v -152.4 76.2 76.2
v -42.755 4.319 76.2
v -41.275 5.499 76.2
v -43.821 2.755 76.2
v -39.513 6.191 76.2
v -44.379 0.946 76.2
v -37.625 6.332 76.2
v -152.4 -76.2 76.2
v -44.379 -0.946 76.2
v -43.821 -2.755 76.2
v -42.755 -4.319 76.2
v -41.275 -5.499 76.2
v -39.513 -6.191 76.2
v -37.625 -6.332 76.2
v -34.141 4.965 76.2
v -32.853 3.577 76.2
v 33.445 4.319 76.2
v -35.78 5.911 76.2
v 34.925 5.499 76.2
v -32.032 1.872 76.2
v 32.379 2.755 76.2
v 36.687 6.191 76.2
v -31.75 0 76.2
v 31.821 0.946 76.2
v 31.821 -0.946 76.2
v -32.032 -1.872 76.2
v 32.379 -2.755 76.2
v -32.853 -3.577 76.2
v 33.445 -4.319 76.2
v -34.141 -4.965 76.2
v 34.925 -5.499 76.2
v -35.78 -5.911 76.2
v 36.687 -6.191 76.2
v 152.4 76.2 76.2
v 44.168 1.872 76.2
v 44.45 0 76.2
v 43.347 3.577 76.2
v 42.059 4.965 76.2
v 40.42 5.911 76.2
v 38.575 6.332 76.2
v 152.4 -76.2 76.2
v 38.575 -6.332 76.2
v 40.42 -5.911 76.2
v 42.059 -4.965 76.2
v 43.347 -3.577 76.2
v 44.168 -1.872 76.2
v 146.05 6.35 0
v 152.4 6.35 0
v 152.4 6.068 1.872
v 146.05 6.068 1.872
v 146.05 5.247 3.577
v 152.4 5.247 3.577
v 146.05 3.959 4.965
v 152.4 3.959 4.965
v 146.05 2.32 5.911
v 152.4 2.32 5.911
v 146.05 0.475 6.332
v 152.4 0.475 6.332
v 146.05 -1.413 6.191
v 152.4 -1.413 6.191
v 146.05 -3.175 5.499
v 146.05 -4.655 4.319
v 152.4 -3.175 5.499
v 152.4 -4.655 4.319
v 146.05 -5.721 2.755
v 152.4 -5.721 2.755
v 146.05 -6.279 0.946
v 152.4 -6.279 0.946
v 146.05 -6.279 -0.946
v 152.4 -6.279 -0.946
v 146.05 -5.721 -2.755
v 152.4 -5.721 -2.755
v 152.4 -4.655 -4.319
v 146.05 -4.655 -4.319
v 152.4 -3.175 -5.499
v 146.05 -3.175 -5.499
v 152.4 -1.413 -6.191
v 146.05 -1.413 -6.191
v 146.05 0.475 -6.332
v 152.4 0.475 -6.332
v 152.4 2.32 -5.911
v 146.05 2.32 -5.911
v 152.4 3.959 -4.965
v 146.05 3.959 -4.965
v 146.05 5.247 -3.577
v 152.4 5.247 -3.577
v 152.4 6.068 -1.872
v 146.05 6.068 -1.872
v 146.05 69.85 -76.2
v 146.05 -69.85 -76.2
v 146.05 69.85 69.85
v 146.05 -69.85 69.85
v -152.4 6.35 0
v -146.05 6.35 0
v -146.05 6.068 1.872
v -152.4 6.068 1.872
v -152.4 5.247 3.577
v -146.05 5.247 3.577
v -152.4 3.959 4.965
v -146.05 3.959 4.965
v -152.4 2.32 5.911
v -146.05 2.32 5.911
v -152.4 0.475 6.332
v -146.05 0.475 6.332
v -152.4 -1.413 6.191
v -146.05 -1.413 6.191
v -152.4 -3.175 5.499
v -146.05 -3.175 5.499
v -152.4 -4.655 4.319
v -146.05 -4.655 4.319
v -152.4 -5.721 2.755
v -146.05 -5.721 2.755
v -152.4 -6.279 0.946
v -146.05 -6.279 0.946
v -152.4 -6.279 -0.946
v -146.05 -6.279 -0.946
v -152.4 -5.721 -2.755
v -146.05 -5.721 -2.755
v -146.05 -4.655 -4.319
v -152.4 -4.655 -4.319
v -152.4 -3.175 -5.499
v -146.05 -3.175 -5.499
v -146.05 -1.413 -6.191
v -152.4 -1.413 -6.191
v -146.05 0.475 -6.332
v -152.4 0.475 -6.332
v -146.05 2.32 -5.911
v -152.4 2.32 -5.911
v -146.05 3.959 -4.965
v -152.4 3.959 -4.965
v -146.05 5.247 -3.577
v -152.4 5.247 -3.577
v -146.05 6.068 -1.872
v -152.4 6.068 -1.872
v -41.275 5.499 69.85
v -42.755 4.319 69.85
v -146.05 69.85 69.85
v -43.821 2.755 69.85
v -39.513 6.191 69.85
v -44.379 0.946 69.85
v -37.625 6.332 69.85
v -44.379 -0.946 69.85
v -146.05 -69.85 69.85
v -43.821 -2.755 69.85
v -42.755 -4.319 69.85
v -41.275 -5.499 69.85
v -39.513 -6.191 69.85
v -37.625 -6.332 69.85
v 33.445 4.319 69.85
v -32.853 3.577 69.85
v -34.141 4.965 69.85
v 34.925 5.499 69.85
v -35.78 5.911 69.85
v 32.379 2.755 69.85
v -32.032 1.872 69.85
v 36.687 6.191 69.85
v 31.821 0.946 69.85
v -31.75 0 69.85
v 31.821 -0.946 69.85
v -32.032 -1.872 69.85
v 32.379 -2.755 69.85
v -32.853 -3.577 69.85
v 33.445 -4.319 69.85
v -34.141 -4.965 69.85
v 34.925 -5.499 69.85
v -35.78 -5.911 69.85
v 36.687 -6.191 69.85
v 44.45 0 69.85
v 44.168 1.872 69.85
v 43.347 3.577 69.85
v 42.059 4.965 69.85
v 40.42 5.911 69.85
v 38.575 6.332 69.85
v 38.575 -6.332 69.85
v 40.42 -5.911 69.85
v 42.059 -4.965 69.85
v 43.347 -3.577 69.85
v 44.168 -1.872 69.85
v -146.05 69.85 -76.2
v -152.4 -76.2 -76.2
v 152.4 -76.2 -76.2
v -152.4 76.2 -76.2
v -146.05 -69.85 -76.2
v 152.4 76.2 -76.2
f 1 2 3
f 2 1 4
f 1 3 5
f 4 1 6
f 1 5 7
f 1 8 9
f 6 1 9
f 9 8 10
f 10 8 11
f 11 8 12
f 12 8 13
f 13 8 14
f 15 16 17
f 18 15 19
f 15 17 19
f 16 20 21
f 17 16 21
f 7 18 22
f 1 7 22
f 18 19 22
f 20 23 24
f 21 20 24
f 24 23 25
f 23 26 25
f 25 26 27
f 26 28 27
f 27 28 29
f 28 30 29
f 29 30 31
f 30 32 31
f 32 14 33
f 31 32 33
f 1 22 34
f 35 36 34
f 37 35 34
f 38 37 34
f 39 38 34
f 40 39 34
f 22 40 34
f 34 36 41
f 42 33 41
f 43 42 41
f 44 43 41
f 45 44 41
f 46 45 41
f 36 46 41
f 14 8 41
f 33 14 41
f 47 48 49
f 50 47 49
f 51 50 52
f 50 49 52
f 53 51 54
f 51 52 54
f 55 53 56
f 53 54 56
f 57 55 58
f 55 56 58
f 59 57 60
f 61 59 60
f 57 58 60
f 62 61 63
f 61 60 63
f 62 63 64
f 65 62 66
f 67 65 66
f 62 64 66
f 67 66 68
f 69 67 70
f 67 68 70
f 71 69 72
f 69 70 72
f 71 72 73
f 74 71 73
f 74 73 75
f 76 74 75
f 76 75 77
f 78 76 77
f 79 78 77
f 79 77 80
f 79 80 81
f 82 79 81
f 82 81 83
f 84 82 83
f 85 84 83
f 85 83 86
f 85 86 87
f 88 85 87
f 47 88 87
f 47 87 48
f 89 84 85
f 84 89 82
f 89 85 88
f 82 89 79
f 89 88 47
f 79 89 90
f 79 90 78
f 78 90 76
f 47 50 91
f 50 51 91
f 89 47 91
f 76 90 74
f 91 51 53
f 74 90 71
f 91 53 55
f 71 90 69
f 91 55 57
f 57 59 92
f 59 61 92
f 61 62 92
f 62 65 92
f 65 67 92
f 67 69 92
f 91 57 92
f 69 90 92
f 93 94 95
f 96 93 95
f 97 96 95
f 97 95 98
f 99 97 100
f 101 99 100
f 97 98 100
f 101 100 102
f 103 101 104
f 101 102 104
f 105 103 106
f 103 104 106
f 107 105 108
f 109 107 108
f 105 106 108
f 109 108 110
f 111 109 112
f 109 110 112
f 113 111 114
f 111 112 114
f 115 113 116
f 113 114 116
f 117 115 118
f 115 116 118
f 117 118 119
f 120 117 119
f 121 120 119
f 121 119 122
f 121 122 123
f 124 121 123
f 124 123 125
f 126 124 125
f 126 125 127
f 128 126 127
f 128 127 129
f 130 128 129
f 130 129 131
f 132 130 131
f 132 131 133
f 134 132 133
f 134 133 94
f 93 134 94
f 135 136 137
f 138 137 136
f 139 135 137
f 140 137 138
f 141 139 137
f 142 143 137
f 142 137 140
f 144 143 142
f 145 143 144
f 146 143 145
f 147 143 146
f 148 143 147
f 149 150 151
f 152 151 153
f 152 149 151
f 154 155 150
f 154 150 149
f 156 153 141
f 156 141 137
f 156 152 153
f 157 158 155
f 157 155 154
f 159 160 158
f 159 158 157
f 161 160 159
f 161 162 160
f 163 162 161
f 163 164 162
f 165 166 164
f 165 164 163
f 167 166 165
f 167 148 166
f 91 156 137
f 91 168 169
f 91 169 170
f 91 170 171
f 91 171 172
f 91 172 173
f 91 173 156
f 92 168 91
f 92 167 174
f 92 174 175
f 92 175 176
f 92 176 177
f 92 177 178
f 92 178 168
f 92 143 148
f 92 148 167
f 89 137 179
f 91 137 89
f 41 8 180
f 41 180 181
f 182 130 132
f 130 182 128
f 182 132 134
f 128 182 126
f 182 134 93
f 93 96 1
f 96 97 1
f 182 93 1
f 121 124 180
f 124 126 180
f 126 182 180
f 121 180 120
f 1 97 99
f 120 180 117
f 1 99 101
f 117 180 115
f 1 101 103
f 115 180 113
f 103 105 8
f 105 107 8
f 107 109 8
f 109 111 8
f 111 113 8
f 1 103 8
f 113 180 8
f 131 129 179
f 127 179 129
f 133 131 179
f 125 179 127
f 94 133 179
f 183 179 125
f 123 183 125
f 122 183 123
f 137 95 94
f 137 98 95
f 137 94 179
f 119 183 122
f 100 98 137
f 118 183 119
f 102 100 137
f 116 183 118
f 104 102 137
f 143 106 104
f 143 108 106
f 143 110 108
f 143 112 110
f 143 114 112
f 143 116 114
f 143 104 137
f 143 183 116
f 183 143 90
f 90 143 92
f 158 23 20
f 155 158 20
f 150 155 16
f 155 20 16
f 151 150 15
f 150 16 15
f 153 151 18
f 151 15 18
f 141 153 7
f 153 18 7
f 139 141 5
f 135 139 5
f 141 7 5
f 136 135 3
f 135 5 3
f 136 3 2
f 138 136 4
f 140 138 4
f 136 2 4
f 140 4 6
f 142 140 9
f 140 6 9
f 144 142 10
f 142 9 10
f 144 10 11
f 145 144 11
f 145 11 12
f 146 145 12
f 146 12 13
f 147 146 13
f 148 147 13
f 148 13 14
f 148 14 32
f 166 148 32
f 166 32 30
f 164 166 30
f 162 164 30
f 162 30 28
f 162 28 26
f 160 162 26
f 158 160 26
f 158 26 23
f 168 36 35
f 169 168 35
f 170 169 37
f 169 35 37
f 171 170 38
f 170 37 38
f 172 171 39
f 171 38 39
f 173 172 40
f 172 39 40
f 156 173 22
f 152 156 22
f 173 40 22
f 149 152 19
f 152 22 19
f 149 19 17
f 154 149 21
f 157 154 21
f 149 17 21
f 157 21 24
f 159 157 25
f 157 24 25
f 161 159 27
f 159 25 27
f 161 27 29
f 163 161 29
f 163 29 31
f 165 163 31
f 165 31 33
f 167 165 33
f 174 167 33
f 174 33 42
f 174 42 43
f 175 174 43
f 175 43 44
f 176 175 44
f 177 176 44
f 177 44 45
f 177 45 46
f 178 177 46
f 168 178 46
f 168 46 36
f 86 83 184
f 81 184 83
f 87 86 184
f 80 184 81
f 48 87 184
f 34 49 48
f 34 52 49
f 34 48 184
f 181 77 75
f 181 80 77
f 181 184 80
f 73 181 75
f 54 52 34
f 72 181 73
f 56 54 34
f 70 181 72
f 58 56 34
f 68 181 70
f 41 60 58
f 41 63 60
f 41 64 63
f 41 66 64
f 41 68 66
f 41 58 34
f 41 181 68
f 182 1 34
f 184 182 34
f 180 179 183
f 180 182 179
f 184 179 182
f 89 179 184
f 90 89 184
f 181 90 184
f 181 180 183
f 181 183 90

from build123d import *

# Parameters (mm, degrees)
F0_W     = 304.8
F0_H     = 152.4
F1_DEPTH = 76.2
F2_T     = -6.35
F3_R     = 6.35
F4_DEPTH = 434.16217
F5_R     = 6.35
F6_DEPTH = 64.02061


with BuildPart() as f1:
    # F0 (on Front) → F1 (new body, symmetric)
    with BuildSketch(Plane.XZ):
        Rectangle(F0_W, F0_H)
    extrude(amount=F1_DEPTH, both=True)

    # F2
    f2_openings = [f1.faces().sort_by_distance(p)[0] for p in [
        (0, 0, -76.2),
    ]]
    offset(amount=F2_T, openings=f2_openings)

    # F3 (on face) → F4 (cut)
    with BuildSketch(Plane.YZ.offset(152.4)):
        Circle(F3_R)
    extrude(amount=-F4_DEPTH, mode=Mode.SUBTRACT)

    # F5 (on face) → F6 (cut)
    with BuildSketch(Plane.XY.offset(76.2)):
        with Locations((-38.1, 0)):
            Circle(F5_R)
        with Locations((38.1, 0)):
            Circle(F5_R)
    extrude(amount=-F6_DEPTH, mode=Mode.SUBTRACT)


solid = f1.part
